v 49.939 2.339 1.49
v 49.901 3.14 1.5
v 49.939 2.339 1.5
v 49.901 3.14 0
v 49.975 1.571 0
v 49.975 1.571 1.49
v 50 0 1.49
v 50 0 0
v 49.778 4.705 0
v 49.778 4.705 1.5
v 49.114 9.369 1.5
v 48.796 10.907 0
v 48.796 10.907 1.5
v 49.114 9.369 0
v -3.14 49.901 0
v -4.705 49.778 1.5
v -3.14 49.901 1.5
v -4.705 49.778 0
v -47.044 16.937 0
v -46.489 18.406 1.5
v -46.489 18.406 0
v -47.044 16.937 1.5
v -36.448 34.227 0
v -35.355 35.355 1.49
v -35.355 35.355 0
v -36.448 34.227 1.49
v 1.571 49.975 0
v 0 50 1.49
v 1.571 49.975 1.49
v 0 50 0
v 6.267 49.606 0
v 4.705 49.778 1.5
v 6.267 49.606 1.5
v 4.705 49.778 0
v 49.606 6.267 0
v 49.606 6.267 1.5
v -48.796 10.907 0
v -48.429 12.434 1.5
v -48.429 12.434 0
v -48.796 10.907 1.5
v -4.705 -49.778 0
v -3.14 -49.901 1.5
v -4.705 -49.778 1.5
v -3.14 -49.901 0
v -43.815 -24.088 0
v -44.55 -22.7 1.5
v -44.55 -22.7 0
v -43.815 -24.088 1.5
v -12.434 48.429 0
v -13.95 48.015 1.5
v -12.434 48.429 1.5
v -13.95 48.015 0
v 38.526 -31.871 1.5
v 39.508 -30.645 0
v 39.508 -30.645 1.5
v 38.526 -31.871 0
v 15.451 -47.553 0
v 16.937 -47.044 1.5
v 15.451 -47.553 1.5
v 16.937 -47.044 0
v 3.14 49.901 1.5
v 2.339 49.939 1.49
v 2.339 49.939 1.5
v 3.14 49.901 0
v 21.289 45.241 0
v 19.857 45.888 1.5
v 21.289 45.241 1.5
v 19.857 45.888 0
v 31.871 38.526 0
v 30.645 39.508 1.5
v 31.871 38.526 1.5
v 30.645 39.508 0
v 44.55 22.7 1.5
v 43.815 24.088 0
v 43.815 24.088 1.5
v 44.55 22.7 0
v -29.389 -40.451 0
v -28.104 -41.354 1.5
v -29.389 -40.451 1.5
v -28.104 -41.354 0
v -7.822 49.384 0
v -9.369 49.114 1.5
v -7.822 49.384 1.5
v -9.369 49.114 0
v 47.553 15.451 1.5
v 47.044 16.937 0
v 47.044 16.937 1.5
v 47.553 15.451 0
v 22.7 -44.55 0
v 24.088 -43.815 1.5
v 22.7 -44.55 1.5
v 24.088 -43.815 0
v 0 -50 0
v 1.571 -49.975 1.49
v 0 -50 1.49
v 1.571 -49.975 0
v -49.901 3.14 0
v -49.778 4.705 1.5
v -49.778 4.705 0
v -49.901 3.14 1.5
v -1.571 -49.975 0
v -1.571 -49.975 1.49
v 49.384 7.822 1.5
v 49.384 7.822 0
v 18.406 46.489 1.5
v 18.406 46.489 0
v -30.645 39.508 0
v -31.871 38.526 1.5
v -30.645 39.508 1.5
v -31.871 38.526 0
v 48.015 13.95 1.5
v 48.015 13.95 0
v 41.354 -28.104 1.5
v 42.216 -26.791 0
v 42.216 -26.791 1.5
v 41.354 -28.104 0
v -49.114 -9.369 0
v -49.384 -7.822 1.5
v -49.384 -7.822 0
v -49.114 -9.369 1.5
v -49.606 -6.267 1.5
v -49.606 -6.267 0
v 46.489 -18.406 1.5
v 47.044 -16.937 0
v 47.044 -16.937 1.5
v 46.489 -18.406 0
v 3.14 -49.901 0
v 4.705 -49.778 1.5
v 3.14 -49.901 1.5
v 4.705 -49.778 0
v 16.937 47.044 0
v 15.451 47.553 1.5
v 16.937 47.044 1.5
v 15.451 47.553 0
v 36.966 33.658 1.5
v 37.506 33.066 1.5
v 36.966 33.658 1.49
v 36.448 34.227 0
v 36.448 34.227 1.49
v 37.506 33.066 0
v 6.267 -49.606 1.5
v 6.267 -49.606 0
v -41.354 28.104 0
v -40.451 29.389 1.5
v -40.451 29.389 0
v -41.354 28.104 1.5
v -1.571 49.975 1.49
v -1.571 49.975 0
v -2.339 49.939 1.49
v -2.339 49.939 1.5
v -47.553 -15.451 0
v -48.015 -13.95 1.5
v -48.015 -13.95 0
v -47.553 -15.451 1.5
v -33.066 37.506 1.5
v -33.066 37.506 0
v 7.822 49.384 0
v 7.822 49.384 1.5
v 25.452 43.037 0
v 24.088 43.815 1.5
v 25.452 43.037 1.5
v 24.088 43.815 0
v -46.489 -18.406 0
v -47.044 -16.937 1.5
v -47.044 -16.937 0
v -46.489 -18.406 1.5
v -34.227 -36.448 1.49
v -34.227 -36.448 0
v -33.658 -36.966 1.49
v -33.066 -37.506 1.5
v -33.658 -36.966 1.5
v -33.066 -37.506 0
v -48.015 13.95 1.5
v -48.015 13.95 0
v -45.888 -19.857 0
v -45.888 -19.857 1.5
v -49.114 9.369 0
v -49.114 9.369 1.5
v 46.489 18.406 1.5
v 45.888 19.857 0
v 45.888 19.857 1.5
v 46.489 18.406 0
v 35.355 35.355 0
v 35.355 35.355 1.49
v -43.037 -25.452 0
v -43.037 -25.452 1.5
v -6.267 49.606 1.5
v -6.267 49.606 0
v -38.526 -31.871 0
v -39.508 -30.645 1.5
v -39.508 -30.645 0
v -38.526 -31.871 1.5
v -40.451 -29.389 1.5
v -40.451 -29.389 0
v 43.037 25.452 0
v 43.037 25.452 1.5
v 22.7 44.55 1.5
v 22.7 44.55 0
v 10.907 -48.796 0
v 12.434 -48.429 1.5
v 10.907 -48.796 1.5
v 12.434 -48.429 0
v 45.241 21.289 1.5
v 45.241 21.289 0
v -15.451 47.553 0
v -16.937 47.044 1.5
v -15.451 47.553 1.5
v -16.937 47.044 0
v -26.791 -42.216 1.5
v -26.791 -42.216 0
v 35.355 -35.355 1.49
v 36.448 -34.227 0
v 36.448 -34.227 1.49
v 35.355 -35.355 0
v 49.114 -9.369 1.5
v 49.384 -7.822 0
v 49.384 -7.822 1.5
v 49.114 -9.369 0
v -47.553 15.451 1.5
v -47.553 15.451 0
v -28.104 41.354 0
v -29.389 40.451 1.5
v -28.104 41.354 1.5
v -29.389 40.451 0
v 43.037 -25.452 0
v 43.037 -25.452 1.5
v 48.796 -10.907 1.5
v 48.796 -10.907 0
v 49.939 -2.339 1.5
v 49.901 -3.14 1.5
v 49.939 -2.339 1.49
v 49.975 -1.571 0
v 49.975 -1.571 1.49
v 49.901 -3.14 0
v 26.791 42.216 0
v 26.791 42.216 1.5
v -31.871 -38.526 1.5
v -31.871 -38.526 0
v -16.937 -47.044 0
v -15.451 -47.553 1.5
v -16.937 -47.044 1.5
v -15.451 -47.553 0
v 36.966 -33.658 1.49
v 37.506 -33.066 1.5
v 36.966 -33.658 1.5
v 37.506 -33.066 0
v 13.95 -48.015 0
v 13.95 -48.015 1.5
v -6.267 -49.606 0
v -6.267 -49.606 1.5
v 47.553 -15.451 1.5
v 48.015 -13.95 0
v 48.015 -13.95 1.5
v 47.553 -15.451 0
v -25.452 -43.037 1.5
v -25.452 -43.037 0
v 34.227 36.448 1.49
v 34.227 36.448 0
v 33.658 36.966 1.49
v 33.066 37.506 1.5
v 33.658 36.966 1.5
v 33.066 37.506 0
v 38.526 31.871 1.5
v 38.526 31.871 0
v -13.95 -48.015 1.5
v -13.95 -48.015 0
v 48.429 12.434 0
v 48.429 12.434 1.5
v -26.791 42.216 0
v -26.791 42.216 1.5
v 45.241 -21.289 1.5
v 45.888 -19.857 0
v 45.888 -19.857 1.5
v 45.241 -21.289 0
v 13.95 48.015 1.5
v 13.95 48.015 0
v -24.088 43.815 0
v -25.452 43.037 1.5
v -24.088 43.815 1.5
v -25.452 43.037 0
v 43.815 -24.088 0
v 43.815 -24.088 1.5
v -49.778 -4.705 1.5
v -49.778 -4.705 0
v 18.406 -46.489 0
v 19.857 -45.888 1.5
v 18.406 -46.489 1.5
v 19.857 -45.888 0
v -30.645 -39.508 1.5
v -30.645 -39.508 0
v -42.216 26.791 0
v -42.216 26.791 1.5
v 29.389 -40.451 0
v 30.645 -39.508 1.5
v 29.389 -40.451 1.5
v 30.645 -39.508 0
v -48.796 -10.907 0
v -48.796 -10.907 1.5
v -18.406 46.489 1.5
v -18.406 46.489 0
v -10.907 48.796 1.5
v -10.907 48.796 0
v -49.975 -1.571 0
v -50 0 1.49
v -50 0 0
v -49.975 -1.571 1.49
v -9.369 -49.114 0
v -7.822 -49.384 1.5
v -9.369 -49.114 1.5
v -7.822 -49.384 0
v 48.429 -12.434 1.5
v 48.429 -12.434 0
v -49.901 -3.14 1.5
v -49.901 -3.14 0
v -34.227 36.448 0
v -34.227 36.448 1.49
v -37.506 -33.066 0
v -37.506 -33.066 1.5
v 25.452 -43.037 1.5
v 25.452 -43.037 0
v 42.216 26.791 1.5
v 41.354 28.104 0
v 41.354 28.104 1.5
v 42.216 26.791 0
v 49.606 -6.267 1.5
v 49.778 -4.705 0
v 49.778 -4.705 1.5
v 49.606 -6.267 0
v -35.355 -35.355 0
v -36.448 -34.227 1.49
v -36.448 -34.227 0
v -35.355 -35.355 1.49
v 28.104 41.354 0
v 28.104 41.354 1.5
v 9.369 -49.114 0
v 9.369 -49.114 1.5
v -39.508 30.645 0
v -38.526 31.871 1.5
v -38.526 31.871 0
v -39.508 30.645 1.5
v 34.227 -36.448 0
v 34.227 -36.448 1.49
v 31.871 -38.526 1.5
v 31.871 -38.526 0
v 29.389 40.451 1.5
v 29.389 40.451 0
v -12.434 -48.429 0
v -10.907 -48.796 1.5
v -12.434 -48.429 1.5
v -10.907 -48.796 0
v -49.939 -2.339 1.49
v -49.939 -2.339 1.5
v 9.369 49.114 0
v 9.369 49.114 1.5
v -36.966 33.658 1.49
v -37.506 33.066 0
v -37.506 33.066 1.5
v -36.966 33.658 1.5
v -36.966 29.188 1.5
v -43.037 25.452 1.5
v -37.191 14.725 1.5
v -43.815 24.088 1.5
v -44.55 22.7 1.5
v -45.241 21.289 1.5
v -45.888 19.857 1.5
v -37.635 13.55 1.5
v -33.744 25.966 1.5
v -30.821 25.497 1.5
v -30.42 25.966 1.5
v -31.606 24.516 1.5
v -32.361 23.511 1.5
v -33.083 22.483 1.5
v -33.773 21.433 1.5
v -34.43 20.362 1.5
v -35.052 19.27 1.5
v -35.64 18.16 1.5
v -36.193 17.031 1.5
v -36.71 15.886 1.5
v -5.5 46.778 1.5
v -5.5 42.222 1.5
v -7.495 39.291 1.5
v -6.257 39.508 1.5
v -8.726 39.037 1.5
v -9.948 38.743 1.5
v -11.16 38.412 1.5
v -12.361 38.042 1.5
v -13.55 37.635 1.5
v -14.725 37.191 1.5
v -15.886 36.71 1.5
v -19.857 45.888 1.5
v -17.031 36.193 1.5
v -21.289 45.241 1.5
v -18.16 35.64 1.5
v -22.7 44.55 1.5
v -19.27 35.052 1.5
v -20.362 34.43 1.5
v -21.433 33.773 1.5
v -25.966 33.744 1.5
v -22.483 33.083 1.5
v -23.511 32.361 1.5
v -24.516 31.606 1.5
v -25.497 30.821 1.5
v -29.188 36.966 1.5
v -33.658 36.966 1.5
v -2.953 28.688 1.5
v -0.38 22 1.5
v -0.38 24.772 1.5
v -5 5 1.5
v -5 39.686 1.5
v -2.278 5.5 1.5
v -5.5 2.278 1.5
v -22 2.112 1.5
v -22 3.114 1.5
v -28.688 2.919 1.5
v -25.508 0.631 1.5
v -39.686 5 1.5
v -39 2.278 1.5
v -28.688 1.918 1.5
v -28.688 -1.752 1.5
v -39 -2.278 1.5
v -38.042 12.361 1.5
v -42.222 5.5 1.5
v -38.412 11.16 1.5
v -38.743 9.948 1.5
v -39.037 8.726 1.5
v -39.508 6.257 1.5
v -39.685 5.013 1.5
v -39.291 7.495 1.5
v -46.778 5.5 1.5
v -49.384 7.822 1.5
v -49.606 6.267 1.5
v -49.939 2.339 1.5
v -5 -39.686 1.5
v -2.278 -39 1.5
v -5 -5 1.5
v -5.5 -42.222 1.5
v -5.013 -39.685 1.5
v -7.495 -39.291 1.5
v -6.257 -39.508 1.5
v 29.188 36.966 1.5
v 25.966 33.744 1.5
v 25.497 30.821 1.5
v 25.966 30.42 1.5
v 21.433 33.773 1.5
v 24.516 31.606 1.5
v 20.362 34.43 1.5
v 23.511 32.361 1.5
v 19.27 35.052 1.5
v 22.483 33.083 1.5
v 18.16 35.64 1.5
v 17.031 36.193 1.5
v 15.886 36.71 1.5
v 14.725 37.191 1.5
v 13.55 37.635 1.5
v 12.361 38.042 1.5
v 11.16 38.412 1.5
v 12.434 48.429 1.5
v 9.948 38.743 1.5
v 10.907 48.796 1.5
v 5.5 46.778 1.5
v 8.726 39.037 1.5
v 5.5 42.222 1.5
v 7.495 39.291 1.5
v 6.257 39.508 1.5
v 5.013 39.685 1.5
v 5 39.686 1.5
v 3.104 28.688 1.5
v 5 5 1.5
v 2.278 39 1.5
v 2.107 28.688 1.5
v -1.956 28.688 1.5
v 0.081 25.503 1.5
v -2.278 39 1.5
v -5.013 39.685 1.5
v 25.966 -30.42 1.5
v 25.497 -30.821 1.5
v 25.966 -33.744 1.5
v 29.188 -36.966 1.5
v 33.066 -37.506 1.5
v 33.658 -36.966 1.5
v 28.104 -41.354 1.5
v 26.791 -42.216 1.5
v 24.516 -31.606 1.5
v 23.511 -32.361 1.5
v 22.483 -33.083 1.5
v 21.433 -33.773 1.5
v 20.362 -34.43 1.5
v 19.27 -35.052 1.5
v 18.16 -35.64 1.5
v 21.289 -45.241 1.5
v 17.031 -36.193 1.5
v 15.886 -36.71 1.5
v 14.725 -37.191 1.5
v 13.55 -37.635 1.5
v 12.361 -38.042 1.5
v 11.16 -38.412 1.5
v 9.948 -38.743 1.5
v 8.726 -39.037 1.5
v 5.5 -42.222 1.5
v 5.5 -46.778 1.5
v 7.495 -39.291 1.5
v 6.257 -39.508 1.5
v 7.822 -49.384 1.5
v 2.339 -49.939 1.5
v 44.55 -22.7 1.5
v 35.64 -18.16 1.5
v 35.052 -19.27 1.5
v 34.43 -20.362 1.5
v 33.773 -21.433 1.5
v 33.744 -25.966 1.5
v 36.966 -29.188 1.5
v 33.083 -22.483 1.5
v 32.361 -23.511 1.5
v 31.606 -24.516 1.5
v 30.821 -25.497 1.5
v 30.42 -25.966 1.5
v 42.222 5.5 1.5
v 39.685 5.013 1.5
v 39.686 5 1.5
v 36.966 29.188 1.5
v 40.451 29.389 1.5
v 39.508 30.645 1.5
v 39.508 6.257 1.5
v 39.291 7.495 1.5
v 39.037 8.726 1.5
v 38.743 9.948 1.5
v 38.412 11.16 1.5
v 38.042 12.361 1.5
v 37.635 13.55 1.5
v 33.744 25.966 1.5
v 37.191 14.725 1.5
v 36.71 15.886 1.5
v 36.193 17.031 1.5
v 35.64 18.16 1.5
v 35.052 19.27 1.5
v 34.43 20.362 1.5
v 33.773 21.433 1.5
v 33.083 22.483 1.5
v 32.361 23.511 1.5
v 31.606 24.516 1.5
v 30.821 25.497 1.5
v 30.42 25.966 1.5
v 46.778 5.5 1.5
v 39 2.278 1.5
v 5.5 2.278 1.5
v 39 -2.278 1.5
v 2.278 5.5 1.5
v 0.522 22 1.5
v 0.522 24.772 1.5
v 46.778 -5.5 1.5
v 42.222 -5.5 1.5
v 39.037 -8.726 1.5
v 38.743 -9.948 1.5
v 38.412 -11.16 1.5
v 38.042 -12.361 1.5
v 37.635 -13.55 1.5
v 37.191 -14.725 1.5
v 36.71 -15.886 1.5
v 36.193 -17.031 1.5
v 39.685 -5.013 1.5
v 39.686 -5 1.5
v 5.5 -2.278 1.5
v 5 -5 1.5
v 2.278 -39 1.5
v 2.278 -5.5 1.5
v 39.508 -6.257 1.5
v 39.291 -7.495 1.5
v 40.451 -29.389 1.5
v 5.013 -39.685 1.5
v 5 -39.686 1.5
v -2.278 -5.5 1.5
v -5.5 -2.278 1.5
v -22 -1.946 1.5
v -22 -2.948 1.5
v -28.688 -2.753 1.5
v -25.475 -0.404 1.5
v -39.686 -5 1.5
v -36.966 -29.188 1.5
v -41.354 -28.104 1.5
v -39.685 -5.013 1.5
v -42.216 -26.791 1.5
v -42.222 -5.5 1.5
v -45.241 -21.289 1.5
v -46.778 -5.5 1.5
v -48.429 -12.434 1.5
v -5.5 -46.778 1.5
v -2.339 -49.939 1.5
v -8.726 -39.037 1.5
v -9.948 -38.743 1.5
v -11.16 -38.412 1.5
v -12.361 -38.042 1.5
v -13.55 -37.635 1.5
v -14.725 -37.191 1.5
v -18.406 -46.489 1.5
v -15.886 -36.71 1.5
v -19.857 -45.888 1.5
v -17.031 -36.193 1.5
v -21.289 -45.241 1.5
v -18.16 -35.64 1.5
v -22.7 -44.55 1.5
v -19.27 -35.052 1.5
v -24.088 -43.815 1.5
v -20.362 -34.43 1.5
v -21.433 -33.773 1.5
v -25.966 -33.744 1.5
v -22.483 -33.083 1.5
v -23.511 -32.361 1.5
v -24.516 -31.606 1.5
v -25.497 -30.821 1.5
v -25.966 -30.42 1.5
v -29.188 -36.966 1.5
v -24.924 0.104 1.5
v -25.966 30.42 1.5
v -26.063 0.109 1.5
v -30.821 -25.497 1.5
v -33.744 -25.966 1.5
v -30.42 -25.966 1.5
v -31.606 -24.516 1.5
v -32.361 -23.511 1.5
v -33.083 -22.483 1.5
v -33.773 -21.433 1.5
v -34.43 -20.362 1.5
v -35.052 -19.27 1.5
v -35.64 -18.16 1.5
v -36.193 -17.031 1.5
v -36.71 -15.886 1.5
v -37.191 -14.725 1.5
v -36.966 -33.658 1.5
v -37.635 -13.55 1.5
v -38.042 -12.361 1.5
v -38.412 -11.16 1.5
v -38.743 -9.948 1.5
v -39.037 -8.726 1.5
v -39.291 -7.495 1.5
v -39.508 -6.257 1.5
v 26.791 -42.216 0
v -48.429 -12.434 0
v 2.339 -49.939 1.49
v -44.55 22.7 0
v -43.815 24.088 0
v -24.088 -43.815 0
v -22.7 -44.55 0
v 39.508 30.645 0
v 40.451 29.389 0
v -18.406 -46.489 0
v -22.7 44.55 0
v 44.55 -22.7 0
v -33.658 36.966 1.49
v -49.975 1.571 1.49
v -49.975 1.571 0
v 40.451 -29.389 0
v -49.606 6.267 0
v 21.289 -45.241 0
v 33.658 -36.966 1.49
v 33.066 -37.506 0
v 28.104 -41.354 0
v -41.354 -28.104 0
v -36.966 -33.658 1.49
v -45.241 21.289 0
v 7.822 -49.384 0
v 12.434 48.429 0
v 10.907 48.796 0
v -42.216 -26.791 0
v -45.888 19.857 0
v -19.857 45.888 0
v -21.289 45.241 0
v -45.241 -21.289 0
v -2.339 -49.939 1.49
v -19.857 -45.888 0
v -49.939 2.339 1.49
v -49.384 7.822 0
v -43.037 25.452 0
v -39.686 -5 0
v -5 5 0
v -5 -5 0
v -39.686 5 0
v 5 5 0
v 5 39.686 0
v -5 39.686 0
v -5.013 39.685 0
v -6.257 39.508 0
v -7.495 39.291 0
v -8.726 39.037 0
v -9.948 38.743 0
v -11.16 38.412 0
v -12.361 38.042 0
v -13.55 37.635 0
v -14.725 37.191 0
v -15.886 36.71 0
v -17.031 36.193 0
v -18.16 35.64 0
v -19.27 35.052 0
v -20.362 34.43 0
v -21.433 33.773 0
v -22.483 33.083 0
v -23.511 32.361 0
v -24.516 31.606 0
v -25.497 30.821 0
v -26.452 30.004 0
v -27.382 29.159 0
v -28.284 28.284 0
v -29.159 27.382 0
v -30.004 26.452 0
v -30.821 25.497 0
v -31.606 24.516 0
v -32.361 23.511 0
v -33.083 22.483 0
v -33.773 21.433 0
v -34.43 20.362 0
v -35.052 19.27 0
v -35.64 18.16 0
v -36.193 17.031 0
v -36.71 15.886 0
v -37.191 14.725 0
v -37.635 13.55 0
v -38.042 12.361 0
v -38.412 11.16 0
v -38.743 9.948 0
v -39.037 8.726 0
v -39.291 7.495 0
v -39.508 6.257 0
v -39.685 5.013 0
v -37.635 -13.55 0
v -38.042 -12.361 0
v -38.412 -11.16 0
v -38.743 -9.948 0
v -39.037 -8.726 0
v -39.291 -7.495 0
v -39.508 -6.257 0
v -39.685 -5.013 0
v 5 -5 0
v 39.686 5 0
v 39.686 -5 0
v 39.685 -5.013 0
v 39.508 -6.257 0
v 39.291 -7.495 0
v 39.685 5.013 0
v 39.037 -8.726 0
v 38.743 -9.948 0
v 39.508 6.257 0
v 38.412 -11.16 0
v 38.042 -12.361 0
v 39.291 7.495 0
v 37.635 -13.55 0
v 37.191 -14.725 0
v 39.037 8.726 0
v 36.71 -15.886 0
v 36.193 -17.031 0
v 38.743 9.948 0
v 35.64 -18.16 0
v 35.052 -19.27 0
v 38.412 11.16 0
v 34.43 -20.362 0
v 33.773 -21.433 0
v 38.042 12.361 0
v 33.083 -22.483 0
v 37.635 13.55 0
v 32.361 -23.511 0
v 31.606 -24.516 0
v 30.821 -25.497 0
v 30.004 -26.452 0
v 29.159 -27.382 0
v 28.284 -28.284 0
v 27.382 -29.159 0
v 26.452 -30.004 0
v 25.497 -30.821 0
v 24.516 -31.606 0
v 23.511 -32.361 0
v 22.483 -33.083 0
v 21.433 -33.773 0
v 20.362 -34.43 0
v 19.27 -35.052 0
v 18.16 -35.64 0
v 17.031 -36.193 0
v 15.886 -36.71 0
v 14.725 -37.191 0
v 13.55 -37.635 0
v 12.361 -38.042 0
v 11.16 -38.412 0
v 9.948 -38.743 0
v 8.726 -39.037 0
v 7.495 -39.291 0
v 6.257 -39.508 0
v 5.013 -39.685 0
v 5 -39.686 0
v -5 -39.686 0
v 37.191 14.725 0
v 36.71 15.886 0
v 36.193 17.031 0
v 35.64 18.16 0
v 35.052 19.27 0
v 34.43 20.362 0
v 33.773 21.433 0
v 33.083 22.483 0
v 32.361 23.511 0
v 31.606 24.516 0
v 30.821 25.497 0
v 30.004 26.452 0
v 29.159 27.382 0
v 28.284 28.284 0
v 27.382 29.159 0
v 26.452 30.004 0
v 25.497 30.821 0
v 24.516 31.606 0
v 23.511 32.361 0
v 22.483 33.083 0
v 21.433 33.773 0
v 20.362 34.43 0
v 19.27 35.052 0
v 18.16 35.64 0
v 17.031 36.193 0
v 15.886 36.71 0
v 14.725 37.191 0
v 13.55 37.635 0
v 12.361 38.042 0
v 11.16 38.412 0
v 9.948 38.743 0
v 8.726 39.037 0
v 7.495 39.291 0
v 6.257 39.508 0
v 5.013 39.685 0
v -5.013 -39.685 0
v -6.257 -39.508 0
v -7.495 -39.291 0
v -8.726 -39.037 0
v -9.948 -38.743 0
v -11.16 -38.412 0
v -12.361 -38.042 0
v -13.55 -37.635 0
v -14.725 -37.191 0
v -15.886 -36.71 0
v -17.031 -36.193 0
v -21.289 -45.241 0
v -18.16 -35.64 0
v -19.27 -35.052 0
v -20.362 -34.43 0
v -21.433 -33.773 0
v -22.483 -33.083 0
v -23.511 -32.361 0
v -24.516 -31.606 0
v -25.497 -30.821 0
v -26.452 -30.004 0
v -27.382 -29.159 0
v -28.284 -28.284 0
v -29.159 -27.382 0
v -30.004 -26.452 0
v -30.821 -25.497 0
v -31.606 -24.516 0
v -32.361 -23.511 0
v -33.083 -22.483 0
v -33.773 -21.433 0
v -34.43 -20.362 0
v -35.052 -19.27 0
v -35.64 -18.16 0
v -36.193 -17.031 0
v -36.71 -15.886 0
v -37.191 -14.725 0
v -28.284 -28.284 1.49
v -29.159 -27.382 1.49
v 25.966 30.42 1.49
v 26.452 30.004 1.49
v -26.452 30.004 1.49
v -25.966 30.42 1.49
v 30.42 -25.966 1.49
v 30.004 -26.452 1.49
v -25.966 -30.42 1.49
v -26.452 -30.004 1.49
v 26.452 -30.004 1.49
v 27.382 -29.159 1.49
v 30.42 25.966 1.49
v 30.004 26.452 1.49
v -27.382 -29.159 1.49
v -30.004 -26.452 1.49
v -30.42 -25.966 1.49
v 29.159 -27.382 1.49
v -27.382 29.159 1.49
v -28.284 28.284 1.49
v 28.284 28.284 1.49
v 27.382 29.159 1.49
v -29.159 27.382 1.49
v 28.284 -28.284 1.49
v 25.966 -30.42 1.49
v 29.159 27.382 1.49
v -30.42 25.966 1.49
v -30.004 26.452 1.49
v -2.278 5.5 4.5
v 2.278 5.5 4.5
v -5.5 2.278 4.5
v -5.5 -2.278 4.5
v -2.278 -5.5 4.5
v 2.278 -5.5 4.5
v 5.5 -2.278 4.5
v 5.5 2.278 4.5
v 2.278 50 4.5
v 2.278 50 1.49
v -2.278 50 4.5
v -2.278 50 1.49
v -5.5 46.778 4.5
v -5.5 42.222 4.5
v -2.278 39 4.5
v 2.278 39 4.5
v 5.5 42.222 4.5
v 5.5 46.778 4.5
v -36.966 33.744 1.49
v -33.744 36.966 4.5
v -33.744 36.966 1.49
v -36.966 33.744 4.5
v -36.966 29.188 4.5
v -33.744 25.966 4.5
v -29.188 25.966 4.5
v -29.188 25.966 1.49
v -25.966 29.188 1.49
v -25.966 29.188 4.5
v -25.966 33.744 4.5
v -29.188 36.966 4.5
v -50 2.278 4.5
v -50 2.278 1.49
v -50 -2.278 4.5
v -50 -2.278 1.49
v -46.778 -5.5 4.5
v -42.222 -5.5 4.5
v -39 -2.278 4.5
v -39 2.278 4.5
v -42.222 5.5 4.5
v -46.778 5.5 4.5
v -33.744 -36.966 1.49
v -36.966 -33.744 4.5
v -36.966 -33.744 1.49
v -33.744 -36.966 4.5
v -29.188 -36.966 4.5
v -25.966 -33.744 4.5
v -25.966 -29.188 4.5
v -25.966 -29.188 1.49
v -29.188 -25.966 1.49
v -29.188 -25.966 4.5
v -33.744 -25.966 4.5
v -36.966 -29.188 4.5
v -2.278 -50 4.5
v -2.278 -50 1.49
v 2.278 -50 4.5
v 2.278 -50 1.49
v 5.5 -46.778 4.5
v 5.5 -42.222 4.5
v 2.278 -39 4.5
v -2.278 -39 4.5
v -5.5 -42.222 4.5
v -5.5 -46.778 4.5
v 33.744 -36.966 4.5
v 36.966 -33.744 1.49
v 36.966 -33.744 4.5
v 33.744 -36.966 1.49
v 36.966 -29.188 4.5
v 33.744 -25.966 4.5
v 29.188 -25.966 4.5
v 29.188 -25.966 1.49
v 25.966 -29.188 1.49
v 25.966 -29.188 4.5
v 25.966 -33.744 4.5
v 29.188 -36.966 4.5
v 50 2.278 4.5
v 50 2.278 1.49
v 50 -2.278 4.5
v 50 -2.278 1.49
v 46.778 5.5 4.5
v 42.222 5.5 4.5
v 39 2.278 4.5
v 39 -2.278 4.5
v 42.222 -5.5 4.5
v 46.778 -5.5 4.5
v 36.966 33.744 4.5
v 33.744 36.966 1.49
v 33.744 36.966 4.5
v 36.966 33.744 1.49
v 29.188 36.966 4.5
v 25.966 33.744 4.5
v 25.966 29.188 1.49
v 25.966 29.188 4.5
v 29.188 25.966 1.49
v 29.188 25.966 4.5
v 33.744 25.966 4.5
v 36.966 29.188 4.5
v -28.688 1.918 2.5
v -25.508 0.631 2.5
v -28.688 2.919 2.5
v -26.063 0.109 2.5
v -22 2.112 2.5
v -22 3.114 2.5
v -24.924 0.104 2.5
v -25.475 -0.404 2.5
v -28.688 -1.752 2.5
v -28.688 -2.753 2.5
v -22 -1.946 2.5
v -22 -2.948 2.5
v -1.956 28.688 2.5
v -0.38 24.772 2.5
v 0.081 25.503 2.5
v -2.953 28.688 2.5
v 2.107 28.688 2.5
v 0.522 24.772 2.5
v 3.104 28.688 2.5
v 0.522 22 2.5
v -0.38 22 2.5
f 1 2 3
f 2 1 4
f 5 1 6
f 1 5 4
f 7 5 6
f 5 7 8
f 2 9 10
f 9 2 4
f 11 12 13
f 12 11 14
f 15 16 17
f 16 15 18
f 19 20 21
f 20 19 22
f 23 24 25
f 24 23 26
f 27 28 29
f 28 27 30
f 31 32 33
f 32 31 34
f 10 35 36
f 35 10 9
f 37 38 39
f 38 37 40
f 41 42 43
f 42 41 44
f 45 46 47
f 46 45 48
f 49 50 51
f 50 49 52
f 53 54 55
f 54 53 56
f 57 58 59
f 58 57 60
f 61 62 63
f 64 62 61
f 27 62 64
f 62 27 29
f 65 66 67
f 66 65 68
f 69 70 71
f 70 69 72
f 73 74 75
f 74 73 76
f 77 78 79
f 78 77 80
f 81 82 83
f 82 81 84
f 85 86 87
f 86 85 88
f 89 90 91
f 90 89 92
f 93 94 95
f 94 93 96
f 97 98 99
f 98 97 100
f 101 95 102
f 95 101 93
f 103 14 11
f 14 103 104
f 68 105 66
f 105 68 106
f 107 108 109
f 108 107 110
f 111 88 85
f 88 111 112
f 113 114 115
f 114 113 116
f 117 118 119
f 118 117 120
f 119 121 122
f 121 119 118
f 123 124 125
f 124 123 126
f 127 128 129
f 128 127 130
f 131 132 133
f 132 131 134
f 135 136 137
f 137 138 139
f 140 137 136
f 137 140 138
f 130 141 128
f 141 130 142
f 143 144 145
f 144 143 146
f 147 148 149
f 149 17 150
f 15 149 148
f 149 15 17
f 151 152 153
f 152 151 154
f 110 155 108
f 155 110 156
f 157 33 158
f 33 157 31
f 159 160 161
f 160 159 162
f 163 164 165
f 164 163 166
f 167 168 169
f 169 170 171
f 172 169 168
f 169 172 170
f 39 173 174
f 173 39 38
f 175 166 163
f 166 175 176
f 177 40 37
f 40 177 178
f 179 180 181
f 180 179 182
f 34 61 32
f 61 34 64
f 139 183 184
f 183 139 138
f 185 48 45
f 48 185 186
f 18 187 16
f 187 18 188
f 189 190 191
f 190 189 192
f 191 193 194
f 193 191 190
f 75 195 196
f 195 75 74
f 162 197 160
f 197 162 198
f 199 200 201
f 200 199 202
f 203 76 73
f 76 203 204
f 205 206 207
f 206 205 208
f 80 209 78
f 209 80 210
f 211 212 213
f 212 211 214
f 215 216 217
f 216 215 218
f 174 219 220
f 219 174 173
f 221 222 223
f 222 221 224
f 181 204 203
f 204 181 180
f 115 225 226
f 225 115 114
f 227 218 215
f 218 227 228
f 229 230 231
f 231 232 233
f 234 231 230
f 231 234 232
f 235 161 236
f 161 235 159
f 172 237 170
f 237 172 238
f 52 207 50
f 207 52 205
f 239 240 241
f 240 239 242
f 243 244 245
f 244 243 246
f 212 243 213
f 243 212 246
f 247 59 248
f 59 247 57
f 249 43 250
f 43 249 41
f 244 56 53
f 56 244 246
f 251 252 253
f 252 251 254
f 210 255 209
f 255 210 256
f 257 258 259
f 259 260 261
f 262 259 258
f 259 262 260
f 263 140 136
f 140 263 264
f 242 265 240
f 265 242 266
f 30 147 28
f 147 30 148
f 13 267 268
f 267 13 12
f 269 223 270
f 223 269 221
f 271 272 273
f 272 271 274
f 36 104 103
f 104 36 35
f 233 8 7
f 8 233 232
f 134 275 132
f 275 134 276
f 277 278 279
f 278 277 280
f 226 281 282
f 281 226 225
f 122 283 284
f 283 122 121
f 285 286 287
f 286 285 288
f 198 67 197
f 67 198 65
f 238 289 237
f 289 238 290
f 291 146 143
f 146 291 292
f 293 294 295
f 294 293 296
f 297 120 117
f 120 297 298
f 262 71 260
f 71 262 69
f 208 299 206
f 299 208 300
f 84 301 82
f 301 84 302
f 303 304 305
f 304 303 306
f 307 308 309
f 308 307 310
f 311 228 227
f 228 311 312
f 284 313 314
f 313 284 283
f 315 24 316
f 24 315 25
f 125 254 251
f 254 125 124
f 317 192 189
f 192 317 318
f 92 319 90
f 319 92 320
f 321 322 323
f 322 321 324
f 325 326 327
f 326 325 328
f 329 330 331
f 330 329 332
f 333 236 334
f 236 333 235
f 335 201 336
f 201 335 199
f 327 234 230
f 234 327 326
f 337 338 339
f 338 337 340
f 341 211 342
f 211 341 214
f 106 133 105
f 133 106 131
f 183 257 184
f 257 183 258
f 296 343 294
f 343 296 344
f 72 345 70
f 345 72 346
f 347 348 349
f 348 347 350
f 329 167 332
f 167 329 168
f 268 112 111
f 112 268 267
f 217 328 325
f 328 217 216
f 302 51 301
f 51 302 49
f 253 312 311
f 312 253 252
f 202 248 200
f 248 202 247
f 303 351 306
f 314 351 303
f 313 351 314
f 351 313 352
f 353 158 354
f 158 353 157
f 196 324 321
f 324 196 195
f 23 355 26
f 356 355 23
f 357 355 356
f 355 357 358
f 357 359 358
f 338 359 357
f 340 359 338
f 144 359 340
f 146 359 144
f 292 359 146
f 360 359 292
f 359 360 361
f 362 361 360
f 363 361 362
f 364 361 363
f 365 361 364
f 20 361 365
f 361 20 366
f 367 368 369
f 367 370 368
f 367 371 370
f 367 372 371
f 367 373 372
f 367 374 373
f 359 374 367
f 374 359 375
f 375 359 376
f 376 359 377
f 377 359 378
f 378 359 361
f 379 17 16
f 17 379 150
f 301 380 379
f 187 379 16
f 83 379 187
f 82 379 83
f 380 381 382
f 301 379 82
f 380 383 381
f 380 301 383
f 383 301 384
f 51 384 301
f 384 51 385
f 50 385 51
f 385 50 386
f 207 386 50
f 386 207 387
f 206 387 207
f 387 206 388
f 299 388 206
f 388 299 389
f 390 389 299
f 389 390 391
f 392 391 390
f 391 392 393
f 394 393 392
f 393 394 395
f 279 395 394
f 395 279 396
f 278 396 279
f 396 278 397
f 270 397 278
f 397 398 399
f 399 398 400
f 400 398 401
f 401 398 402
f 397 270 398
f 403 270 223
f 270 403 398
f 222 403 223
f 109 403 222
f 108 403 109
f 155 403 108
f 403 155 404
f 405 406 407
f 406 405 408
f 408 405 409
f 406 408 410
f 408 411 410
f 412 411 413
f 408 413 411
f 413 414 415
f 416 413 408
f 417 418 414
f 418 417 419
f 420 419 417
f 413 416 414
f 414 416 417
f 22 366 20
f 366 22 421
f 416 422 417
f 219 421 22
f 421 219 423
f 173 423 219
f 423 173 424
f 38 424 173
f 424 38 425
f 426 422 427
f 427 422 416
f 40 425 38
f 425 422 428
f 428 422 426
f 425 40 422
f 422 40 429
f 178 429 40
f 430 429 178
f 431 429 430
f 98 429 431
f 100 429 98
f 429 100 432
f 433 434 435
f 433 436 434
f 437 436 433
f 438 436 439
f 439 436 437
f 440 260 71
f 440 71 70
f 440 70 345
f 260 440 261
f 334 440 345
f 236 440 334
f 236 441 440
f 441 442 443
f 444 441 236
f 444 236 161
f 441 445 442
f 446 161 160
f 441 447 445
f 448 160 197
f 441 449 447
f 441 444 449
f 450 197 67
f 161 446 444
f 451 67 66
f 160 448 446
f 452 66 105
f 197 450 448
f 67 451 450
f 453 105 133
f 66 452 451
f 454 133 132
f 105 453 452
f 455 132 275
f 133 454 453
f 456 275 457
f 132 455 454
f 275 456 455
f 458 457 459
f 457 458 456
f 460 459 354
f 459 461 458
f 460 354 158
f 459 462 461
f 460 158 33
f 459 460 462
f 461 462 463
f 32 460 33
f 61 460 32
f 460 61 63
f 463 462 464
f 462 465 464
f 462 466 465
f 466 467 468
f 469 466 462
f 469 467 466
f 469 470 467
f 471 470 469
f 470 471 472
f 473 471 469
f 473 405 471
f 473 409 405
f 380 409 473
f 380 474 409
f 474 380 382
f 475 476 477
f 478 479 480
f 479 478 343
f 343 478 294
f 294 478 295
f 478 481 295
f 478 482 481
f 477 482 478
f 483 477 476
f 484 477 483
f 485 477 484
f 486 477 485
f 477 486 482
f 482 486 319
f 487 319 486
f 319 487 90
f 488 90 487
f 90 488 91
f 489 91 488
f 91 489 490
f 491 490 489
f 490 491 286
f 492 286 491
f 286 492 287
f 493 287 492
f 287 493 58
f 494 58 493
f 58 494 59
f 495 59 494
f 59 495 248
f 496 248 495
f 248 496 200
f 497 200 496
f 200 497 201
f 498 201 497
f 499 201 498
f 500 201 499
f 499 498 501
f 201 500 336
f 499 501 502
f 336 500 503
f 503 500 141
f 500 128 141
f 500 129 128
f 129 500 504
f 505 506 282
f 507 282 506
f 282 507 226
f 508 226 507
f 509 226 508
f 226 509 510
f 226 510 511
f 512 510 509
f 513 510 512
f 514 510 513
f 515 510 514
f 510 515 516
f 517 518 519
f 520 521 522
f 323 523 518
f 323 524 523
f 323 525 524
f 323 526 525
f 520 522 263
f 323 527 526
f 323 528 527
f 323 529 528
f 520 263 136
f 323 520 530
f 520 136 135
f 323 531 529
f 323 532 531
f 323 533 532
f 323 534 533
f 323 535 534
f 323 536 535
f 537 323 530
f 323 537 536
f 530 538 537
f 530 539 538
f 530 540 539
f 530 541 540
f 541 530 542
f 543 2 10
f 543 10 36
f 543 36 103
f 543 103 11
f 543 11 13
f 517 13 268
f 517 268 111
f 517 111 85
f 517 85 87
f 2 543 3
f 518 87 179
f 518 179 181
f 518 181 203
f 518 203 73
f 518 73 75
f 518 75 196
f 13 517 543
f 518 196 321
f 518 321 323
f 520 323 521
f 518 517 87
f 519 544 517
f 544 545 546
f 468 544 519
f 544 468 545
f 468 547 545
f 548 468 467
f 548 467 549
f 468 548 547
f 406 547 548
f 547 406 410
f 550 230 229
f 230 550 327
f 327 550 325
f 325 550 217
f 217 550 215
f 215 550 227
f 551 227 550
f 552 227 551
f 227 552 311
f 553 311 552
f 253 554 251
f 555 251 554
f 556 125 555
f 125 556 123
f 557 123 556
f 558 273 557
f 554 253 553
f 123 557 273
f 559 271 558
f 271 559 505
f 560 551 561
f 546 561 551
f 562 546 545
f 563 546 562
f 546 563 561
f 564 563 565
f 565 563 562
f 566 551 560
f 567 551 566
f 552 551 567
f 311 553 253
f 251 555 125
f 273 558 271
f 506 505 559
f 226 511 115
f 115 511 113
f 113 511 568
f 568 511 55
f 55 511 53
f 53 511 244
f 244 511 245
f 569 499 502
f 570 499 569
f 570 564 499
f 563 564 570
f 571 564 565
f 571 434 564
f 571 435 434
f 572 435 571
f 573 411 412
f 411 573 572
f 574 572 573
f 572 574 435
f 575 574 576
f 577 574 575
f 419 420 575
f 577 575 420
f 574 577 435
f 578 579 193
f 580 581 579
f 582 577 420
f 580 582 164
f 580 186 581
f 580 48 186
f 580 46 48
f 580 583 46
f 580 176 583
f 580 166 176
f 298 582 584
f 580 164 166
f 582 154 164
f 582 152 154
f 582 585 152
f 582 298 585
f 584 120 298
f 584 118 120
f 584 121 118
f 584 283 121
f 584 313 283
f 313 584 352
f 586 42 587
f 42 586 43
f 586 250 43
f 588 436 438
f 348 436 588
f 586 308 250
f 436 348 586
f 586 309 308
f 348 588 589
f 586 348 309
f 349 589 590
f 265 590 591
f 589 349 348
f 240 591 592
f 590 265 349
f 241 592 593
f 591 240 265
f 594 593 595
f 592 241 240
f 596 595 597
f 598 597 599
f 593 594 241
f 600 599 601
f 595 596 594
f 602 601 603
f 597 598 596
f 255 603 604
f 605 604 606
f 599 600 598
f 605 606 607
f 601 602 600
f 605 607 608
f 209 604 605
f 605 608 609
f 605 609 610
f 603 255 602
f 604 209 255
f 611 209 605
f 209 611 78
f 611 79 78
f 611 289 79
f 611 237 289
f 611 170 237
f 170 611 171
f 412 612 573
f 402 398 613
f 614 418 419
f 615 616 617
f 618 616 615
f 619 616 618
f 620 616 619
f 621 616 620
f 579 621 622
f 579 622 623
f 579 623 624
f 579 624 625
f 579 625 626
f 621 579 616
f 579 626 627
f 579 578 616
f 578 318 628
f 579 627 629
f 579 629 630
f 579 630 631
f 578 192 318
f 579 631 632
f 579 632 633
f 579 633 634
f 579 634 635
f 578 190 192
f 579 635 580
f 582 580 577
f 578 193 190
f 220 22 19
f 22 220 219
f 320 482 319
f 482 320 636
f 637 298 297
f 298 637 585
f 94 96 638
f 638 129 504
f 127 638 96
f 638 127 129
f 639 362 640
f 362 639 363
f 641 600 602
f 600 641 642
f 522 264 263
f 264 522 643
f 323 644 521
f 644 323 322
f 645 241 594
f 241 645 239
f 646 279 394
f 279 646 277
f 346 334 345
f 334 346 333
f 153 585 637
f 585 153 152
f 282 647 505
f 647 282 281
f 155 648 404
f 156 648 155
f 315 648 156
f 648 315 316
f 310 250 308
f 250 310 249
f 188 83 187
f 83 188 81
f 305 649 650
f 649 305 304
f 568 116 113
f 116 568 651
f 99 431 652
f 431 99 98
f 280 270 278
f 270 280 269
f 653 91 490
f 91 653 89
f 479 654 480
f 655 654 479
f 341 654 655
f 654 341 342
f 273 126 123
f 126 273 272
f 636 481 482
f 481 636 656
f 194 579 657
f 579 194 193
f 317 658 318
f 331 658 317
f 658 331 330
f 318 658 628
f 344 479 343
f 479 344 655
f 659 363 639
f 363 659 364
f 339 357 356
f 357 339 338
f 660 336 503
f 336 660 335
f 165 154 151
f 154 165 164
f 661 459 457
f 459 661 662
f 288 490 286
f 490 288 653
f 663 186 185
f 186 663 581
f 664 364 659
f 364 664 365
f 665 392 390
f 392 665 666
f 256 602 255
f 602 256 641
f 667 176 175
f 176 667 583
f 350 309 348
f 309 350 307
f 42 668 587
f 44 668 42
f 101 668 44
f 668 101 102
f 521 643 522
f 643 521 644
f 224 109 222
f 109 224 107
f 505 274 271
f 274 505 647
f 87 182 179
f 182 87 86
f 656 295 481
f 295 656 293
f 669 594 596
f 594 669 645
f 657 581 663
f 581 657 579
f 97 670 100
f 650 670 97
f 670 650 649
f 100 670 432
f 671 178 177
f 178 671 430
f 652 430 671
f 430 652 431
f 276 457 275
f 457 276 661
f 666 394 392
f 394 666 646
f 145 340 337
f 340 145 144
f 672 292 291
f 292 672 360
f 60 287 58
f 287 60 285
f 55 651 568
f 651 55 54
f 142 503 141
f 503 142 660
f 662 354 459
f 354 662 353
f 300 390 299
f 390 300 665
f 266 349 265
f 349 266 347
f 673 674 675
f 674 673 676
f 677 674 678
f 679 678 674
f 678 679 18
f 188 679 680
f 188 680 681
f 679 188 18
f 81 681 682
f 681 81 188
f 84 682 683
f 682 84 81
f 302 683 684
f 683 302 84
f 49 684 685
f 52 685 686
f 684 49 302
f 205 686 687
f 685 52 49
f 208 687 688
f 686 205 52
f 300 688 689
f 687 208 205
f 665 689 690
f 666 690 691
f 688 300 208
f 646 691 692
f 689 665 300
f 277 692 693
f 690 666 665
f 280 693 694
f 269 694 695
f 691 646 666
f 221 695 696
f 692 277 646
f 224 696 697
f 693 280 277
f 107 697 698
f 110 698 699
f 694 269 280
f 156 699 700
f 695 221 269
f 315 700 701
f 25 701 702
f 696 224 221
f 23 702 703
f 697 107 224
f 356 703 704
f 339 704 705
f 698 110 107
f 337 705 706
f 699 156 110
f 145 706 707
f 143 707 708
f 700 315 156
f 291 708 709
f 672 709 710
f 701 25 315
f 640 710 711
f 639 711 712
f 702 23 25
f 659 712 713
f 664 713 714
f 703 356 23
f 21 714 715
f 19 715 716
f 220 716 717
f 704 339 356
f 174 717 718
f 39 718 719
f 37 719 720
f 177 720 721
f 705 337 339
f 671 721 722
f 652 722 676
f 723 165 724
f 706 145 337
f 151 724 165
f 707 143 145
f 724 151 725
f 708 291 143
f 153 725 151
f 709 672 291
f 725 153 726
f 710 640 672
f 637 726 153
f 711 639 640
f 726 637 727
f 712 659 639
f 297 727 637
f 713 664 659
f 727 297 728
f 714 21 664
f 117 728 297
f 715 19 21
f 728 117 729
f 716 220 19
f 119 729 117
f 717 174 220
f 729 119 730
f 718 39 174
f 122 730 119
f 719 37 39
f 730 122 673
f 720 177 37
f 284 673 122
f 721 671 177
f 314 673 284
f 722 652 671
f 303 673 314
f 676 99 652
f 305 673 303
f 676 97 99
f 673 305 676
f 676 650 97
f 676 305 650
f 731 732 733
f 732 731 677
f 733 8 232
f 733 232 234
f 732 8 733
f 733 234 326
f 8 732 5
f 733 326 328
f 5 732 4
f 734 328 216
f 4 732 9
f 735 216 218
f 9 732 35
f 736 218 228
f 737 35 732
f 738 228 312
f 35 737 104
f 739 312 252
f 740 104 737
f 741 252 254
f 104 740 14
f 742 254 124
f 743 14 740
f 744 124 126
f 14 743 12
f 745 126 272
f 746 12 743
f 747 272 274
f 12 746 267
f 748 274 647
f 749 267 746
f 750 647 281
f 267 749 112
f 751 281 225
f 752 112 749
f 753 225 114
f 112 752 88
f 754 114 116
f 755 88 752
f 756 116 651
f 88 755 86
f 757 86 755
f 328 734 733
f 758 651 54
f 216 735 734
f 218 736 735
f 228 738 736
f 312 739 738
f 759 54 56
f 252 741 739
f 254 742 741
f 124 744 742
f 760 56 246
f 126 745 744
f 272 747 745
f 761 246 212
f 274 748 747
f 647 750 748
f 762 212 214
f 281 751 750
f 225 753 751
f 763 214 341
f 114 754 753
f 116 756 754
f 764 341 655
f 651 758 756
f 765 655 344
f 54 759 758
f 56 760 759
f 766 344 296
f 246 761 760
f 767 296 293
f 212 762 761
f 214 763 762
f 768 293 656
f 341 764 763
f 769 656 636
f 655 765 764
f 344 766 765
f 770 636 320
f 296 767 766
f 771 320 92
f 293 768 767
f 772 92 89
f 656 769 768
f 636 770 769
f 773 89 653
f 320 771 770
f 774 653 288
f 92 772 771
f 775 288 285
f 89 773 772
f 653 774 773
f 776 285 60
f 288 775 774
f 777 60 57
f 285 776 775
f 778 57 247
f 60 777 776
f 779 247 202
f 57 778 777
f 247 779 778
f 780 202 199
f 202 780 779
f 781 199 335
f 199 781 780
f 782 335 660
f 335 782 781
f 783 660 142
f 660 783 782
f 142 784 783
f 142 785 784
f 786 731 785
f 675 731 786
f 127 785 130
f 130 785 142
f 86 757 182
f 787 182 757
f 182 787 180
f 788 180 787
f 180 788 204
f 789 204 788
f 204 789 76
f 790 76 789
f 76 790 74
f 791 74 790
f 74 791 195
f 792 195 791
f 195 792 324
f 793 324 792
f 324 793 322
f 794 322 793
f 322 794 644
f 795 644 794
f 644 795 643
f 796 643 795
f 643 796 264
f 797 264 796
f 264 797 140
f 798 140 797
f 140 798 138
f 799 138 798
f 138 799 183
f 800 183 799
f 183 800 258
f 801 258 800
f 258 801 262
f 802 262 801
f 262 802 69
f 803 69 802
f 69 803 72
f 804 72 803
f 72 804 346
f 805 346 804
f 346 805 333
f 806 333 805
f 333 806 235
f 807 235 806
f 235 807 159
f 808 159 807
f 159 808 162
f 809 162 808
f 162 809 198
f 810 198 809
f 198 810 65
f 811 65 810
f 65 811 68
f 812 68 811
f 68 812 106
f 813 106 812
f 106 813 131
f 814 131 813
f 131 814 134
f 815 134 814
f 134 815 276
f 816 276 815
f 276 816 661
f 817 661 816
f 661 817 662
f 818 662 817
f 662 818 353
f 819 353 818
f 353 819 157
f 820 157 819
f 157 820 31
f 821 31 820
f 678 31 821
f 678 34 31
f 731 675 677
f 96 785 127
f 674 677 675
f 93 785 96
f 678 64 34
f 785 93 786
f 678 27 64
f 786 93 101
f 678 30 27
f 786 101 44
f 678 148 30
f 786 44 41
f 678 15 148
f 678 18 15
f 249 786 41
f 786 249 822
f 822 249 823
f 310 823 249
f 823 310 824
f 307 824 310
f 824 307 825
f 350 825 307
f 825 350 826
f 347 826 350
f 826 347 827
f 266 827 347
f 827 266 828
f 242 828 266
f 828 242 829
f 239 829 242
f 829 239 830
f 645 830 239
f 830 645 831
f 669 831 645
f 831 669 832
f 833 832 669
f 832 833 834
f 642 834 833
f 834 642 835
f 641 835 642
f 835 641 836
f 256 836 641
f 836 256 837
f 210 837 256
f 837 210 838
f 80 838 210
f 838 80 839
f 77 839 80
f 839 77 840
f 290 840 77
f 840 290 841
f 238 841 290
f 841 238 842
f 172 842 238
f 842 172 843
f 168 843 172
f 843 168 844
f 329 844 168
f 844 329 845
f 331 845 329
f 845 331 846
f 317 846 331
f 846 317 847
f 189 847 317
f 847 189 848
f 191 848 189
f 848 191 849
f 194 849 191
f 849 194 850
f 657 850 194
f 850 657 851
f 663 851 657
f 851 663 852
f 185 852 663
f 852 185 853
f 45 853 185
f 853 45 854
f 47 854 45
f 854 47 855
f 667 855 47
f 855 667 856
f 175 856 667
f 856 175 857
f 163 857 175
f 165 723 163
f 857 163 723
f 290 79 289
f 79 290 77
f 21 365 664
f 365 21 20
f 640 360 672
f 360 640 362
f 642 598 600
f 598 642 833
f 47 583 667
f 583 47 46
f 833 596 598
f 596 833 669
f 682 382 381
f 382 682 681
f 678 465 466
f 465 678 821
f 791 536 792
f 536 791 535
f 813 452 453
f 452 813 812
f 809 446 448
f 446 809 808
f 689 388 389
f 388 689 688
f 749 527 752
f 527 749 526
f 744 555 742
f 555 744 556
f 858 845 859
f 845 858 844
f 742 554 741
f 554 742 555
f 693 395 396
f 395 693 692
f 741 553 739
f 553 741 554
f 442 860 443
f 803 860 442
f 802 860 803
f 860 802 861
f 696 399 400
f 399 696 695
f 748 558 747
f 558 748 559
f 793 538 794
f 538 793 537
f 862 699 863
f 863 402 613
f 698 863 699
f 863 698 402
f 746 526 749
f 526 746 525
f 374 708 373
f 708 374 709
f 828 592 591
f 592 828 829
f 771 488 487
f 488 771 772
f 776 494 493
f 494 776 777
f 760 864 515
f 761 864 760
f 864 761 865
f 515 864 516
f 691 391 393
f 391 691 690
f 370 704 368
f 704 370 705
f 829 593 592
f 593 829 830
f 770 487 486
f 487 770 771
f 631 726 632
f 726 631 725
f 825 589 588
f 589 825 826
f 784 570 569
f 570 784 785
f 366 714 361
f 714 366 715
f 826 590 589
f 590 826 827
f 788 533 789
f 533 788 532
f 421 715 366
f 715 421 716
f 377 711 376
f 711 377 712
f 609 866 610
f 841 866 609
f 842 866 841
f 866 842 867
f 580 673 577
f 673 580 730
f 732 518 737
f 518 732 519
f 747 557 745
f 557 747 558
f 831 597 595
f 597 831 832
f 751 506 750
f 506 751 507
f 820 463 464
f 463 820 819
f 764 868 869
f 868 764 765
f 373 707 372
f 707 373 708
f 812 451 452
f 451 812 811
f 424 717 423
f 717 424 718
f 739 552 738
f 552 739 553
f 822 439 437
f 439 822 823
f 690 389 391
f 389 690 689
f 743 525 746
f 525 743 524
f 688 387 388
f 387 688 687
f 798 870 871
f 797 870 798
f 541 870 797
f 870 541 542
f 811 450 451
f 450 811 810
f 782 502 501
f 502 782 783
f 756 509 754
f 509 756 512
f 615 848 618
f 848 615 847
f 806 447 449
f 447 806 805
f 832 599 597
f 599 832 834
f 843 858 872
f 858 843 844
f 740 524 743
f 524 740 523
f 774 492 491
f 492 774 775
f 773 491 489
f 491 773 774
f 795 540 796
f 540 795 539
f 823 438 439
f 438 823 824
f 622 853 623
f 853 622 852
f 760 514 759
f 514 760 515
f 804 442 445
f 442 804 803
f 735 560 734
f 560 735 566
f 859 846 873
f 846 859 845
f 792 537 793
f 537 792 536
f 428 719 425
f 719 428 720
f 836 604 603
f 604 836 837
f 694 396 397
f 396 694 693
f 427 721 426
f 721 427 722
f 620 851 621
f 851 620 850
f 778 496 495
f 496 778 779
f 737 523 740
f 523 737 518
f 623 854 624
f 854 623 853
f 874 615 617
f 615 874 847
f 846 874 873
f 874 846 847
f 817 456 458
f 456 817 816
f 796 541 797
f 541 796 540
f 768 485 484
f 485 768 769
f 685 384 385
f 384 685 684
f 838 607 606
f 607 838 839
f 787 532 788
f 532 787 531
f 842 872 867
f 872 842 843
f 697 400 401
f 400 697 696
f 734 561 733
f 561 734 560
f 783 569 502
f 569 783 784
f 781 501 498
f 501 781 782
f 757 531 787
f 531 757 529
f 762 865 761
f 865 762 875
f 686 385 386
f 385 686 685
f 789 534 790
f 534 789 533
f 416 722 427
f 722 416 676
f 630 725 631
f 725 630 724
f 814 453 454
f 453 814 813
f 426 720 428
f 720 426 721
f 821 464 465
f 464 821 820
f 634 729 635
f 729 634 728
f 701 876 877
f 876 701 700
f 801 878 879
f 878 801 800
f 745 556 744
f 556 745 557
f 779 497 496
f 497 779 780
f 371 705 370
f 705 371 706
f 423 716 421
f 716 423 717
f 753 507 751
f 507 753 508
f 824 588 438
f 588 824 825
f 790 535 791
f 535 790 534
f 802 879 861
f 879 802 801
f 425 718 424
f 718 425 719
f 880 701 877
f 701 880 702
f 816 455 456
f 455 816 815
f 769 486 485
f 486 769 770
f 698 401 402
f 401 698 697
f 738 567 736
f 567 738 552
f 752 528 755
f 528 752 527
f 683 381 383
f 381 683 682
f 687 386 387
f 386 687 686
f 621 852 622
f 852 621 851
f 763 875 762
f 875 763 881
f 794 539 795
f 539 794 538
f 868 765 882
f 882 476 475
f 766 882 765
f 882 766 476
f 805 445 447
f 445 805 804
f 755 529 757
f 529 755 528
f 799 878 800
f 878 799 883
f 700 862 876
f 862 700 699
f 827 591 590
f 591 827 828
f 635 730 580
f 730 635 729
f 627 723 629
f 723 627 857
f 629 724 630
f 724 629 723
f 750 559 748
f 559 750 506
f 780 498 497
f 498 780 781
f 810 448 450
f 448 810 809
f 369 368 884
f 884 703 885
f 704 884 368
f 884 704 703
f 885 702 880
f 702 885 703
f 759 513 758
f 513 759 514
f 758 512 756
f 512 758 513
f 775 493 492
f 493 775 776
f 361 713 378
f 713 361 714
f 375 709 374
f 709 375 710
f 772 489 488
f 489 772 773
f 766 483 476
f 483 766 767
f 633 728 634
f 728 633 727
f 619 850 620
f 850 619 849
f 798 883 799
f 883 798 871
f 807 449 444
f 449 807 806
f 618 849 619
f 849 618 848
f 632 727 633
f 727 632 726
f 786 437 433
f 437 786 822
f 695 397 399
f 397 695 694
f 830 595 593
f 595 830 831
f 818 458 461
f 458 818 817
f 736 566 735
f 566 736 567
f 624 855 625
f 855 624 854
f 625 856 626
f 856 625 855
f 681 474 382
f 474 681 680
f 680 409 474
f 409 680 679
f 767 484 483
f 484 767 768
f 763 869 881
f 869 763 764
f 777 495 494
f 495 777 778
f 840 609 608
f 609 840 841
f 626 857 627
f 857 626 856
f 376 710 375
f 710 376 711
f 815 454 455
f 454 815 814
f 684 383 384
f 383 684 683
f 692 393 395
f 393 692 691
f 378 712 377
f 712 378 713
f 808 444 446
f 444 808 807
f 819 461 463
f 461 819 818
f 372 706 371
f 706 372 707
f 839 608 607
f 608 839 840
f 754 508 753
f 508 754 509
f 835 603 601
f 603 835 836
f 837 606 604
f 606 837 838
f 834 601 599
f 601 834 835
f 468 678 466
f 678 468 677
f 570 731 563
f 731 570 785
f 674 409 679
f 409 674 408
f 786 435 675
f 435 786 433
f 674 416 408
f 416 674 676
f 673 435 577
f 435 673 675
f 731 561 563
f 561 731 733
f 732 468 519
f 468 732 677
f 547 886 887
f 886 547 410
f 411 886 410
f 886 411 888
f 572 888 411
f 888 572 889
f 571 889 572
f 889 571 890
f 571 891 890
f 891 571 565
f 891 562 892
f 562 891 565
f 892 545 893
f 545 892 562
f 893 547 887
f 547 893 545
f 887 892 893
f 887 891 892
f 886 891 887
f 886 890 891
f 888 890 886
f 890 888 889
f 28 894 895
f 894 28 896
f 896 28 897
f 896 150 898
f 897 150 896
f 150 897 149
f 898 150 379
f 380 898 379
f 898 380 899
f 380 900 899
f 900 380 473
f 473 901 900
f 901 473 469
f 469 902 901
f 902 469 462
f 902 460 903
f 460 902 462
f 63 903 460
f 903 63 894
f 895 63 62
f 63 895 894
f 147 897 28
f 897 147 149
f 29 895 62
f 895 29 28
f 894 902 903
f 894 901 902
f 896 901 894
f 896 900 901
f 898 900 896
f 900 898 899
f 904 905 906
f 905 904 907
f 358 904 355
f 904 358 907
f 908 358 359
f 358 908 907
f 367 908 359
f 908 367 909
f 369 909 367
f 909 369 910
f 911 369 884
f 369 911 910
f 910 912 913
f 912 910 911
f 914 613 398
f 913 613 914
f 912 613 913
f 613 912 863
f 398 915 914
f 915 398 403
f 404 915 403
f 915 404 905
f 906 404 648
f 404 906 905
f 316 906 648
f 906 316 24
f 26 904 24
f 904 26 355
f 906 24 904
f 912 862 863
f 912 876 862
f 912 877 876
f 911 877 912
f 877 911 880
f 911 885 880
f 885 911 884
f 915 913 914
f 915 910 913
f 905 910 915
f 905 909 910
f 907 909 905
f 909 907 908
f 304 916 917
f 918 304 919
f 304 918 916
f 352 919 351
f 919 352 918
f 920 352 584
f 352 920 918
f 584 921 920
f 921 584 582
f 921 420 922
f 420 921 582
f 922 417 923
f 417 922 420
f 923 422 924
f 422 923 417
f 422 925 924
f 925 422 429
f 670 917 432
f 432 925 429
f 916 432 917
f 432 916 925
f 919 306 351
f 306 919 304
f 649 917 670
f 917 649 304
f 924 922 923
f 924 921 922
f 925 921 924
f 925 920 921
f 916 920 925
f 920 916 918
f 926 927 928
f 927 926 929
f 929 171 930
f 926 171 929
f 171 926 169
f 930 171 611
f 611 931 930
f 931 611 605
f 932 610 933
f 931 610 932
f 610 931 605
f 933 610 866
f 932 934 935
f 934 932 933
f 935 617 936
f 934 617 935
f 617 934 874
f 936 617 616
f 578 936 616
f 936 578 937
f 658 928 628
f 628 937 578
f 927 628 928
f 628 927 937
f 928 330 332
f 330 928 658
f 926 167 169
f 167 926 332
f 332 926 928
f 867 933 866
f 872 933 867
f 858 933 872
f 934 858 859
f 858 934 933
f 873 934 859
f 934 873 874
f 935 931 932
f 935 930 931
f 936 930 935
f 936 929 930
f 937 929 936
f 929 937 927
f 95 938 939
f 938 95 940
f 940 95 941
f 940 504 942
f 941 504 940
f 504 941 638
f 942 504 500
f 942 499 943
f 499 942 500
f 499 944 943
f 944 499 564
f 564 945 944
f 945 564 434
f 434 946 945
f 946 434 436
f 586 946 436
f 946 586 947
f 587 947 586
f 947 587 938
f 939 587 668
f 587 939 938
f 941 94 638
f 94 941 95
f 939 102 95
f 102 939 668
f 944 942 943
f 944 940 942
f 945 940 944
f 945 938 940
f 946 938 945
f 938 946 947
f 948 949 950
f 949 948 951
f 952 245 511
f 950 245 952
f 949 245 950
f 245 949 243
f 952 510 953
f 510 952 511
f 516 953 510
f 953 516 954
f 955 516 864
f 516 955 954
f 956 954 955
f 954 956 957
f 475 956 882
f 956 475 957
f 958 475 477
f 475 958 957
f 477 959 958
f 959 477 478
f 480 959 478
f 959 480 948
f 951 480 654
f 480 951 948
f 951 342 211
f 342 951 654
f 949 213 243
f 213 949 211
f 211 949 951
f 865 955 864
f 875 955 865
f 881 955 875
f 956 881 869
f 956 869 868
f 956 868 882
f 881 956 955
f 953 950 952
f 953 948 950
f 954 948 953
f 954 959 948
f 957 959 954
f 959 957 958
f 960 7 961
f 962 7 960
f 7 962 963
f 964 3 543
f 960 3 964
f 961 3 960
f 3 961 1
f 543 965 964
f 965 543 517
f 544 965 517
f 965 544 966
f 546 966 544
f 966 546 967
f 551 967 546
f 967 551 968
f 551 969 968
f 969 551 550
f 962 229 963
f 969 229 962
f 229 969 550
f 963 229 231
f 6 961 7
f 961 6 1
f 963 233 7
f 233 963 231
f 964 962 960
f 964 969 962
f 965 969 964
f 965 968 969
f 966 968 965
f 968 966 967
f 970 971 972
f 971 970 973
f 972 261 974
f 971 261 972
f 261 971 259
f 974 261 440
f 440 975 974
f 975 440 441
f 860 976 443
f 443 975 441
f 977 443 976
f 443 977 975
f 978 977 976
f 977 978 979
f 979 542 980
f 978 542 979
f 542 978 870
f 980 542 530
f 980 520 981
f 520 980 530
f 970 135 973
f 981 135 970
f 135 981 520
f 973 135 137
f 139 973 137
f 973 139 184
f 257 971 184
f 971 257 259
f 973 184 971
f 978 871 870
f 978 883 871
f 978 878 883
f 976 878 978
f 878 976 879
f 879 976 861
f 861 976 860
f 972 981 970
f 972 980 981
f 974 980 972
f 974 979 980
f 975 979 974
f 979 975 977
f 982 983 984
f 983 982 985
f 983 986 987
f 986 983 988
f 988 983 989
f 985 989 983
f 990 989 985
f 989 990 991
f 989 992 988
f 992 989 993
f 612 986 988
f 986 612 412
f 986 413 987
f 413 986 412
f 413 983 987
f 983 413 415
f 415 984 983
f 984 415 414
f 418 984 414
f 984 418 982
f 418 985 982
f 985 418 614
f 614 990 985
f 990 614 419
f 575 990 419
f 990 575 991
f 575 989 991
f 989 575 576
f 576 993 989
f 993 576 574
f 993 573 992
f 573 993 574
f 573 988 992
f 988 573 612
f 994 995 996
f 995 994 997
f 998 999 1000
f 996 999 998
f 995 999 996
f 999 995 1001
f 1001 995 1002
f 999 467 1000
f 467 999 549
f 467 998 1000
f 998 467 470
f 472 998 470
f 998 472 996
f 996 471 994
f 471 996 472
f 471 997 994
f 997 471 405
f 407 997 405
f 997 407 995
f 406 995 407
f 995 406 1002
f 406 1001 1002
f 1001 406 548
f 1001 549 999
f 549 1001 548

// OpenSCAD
// Calibration object for delta sizing
//
// Generate STL using OpenSCAD:
//   openscad calibrate_size.scad -o calibrate_size.stl
$fn=200;

base_radius = 50;
base_height = 1.5;
base_width = 10
;
cylinder_height = 3;
cylinder_radius = 6;
cylinder_outer_dist = 44.5;
ridge_cut_radius = .5;

text_height = 1;
text_size = 7;
spoke_angles = [0, 45, 90, 135, 180, 225, 270, 315];
CUT=0.01;

// Circular ring around entire object (to help reduce warping)
module base_ring() {
    difference() {
        cylinder(h=base_height, r=base_radius);
        translate([0, 0, -CUT])
            cylinder(h=base_height + 2*CUT, r=base_radius-base_width);
    }
}

// The base ring plus the base spokes
module base() {
    base_ring();
    // Spokes
    for (angle=[0,90,180,270])
        rotate([0, 0, angle])
            translate([-base_width/2, -CUT, 0])
                cube([base_width, base_radius-base_width+2*CUT, base_height]);
}

// Cylinder that measurement ridges are cut out of
module measuring_cylinder() {
    cut_width = cylinder_radius;
    difference() {
        cylinder(h=cylinder_height+CUT, r=cylinder_radius, $fn=60);
        for (angle=spoke_angles)
            rotate([0, 0, angle])
                translate([-cut_width, cylinder_radius - ridge_cut_radius, -CUT])
                    cube([2*cut_width, cut_width, cylinder_height+3*CUT]);
    }
}

// All the measuring cylinders around the ring
module measuring_cylinders() {
    measuring_cylinder();
    for (angle=spoke_angles)
        rotate([0, 0, angle])
            translate([0, cylinder_outer_dist, 0])
                measuring_cylinder();
}

// Text writing
module write_text(angle, dist, msg) {
    text_offset = dist + 1 - text_size/2;
    rotate([0, 0, angle])
        translate([0, text_offset, base_height - CUT])
            linear_extrude(height=text_height + CUT)
                text(msg, size=text_size, halign="center");
}

// Final object with text descriptions
module calibration_object() {
    base();
    translate([0, 0, base_height-CUT])
        measuring_cylinders();
    write_text(90, cylinder_outer_dist - 20, "X");
    write_text(0, cylinder_outer_dist - 20, "Y");
}

calibration_object();
